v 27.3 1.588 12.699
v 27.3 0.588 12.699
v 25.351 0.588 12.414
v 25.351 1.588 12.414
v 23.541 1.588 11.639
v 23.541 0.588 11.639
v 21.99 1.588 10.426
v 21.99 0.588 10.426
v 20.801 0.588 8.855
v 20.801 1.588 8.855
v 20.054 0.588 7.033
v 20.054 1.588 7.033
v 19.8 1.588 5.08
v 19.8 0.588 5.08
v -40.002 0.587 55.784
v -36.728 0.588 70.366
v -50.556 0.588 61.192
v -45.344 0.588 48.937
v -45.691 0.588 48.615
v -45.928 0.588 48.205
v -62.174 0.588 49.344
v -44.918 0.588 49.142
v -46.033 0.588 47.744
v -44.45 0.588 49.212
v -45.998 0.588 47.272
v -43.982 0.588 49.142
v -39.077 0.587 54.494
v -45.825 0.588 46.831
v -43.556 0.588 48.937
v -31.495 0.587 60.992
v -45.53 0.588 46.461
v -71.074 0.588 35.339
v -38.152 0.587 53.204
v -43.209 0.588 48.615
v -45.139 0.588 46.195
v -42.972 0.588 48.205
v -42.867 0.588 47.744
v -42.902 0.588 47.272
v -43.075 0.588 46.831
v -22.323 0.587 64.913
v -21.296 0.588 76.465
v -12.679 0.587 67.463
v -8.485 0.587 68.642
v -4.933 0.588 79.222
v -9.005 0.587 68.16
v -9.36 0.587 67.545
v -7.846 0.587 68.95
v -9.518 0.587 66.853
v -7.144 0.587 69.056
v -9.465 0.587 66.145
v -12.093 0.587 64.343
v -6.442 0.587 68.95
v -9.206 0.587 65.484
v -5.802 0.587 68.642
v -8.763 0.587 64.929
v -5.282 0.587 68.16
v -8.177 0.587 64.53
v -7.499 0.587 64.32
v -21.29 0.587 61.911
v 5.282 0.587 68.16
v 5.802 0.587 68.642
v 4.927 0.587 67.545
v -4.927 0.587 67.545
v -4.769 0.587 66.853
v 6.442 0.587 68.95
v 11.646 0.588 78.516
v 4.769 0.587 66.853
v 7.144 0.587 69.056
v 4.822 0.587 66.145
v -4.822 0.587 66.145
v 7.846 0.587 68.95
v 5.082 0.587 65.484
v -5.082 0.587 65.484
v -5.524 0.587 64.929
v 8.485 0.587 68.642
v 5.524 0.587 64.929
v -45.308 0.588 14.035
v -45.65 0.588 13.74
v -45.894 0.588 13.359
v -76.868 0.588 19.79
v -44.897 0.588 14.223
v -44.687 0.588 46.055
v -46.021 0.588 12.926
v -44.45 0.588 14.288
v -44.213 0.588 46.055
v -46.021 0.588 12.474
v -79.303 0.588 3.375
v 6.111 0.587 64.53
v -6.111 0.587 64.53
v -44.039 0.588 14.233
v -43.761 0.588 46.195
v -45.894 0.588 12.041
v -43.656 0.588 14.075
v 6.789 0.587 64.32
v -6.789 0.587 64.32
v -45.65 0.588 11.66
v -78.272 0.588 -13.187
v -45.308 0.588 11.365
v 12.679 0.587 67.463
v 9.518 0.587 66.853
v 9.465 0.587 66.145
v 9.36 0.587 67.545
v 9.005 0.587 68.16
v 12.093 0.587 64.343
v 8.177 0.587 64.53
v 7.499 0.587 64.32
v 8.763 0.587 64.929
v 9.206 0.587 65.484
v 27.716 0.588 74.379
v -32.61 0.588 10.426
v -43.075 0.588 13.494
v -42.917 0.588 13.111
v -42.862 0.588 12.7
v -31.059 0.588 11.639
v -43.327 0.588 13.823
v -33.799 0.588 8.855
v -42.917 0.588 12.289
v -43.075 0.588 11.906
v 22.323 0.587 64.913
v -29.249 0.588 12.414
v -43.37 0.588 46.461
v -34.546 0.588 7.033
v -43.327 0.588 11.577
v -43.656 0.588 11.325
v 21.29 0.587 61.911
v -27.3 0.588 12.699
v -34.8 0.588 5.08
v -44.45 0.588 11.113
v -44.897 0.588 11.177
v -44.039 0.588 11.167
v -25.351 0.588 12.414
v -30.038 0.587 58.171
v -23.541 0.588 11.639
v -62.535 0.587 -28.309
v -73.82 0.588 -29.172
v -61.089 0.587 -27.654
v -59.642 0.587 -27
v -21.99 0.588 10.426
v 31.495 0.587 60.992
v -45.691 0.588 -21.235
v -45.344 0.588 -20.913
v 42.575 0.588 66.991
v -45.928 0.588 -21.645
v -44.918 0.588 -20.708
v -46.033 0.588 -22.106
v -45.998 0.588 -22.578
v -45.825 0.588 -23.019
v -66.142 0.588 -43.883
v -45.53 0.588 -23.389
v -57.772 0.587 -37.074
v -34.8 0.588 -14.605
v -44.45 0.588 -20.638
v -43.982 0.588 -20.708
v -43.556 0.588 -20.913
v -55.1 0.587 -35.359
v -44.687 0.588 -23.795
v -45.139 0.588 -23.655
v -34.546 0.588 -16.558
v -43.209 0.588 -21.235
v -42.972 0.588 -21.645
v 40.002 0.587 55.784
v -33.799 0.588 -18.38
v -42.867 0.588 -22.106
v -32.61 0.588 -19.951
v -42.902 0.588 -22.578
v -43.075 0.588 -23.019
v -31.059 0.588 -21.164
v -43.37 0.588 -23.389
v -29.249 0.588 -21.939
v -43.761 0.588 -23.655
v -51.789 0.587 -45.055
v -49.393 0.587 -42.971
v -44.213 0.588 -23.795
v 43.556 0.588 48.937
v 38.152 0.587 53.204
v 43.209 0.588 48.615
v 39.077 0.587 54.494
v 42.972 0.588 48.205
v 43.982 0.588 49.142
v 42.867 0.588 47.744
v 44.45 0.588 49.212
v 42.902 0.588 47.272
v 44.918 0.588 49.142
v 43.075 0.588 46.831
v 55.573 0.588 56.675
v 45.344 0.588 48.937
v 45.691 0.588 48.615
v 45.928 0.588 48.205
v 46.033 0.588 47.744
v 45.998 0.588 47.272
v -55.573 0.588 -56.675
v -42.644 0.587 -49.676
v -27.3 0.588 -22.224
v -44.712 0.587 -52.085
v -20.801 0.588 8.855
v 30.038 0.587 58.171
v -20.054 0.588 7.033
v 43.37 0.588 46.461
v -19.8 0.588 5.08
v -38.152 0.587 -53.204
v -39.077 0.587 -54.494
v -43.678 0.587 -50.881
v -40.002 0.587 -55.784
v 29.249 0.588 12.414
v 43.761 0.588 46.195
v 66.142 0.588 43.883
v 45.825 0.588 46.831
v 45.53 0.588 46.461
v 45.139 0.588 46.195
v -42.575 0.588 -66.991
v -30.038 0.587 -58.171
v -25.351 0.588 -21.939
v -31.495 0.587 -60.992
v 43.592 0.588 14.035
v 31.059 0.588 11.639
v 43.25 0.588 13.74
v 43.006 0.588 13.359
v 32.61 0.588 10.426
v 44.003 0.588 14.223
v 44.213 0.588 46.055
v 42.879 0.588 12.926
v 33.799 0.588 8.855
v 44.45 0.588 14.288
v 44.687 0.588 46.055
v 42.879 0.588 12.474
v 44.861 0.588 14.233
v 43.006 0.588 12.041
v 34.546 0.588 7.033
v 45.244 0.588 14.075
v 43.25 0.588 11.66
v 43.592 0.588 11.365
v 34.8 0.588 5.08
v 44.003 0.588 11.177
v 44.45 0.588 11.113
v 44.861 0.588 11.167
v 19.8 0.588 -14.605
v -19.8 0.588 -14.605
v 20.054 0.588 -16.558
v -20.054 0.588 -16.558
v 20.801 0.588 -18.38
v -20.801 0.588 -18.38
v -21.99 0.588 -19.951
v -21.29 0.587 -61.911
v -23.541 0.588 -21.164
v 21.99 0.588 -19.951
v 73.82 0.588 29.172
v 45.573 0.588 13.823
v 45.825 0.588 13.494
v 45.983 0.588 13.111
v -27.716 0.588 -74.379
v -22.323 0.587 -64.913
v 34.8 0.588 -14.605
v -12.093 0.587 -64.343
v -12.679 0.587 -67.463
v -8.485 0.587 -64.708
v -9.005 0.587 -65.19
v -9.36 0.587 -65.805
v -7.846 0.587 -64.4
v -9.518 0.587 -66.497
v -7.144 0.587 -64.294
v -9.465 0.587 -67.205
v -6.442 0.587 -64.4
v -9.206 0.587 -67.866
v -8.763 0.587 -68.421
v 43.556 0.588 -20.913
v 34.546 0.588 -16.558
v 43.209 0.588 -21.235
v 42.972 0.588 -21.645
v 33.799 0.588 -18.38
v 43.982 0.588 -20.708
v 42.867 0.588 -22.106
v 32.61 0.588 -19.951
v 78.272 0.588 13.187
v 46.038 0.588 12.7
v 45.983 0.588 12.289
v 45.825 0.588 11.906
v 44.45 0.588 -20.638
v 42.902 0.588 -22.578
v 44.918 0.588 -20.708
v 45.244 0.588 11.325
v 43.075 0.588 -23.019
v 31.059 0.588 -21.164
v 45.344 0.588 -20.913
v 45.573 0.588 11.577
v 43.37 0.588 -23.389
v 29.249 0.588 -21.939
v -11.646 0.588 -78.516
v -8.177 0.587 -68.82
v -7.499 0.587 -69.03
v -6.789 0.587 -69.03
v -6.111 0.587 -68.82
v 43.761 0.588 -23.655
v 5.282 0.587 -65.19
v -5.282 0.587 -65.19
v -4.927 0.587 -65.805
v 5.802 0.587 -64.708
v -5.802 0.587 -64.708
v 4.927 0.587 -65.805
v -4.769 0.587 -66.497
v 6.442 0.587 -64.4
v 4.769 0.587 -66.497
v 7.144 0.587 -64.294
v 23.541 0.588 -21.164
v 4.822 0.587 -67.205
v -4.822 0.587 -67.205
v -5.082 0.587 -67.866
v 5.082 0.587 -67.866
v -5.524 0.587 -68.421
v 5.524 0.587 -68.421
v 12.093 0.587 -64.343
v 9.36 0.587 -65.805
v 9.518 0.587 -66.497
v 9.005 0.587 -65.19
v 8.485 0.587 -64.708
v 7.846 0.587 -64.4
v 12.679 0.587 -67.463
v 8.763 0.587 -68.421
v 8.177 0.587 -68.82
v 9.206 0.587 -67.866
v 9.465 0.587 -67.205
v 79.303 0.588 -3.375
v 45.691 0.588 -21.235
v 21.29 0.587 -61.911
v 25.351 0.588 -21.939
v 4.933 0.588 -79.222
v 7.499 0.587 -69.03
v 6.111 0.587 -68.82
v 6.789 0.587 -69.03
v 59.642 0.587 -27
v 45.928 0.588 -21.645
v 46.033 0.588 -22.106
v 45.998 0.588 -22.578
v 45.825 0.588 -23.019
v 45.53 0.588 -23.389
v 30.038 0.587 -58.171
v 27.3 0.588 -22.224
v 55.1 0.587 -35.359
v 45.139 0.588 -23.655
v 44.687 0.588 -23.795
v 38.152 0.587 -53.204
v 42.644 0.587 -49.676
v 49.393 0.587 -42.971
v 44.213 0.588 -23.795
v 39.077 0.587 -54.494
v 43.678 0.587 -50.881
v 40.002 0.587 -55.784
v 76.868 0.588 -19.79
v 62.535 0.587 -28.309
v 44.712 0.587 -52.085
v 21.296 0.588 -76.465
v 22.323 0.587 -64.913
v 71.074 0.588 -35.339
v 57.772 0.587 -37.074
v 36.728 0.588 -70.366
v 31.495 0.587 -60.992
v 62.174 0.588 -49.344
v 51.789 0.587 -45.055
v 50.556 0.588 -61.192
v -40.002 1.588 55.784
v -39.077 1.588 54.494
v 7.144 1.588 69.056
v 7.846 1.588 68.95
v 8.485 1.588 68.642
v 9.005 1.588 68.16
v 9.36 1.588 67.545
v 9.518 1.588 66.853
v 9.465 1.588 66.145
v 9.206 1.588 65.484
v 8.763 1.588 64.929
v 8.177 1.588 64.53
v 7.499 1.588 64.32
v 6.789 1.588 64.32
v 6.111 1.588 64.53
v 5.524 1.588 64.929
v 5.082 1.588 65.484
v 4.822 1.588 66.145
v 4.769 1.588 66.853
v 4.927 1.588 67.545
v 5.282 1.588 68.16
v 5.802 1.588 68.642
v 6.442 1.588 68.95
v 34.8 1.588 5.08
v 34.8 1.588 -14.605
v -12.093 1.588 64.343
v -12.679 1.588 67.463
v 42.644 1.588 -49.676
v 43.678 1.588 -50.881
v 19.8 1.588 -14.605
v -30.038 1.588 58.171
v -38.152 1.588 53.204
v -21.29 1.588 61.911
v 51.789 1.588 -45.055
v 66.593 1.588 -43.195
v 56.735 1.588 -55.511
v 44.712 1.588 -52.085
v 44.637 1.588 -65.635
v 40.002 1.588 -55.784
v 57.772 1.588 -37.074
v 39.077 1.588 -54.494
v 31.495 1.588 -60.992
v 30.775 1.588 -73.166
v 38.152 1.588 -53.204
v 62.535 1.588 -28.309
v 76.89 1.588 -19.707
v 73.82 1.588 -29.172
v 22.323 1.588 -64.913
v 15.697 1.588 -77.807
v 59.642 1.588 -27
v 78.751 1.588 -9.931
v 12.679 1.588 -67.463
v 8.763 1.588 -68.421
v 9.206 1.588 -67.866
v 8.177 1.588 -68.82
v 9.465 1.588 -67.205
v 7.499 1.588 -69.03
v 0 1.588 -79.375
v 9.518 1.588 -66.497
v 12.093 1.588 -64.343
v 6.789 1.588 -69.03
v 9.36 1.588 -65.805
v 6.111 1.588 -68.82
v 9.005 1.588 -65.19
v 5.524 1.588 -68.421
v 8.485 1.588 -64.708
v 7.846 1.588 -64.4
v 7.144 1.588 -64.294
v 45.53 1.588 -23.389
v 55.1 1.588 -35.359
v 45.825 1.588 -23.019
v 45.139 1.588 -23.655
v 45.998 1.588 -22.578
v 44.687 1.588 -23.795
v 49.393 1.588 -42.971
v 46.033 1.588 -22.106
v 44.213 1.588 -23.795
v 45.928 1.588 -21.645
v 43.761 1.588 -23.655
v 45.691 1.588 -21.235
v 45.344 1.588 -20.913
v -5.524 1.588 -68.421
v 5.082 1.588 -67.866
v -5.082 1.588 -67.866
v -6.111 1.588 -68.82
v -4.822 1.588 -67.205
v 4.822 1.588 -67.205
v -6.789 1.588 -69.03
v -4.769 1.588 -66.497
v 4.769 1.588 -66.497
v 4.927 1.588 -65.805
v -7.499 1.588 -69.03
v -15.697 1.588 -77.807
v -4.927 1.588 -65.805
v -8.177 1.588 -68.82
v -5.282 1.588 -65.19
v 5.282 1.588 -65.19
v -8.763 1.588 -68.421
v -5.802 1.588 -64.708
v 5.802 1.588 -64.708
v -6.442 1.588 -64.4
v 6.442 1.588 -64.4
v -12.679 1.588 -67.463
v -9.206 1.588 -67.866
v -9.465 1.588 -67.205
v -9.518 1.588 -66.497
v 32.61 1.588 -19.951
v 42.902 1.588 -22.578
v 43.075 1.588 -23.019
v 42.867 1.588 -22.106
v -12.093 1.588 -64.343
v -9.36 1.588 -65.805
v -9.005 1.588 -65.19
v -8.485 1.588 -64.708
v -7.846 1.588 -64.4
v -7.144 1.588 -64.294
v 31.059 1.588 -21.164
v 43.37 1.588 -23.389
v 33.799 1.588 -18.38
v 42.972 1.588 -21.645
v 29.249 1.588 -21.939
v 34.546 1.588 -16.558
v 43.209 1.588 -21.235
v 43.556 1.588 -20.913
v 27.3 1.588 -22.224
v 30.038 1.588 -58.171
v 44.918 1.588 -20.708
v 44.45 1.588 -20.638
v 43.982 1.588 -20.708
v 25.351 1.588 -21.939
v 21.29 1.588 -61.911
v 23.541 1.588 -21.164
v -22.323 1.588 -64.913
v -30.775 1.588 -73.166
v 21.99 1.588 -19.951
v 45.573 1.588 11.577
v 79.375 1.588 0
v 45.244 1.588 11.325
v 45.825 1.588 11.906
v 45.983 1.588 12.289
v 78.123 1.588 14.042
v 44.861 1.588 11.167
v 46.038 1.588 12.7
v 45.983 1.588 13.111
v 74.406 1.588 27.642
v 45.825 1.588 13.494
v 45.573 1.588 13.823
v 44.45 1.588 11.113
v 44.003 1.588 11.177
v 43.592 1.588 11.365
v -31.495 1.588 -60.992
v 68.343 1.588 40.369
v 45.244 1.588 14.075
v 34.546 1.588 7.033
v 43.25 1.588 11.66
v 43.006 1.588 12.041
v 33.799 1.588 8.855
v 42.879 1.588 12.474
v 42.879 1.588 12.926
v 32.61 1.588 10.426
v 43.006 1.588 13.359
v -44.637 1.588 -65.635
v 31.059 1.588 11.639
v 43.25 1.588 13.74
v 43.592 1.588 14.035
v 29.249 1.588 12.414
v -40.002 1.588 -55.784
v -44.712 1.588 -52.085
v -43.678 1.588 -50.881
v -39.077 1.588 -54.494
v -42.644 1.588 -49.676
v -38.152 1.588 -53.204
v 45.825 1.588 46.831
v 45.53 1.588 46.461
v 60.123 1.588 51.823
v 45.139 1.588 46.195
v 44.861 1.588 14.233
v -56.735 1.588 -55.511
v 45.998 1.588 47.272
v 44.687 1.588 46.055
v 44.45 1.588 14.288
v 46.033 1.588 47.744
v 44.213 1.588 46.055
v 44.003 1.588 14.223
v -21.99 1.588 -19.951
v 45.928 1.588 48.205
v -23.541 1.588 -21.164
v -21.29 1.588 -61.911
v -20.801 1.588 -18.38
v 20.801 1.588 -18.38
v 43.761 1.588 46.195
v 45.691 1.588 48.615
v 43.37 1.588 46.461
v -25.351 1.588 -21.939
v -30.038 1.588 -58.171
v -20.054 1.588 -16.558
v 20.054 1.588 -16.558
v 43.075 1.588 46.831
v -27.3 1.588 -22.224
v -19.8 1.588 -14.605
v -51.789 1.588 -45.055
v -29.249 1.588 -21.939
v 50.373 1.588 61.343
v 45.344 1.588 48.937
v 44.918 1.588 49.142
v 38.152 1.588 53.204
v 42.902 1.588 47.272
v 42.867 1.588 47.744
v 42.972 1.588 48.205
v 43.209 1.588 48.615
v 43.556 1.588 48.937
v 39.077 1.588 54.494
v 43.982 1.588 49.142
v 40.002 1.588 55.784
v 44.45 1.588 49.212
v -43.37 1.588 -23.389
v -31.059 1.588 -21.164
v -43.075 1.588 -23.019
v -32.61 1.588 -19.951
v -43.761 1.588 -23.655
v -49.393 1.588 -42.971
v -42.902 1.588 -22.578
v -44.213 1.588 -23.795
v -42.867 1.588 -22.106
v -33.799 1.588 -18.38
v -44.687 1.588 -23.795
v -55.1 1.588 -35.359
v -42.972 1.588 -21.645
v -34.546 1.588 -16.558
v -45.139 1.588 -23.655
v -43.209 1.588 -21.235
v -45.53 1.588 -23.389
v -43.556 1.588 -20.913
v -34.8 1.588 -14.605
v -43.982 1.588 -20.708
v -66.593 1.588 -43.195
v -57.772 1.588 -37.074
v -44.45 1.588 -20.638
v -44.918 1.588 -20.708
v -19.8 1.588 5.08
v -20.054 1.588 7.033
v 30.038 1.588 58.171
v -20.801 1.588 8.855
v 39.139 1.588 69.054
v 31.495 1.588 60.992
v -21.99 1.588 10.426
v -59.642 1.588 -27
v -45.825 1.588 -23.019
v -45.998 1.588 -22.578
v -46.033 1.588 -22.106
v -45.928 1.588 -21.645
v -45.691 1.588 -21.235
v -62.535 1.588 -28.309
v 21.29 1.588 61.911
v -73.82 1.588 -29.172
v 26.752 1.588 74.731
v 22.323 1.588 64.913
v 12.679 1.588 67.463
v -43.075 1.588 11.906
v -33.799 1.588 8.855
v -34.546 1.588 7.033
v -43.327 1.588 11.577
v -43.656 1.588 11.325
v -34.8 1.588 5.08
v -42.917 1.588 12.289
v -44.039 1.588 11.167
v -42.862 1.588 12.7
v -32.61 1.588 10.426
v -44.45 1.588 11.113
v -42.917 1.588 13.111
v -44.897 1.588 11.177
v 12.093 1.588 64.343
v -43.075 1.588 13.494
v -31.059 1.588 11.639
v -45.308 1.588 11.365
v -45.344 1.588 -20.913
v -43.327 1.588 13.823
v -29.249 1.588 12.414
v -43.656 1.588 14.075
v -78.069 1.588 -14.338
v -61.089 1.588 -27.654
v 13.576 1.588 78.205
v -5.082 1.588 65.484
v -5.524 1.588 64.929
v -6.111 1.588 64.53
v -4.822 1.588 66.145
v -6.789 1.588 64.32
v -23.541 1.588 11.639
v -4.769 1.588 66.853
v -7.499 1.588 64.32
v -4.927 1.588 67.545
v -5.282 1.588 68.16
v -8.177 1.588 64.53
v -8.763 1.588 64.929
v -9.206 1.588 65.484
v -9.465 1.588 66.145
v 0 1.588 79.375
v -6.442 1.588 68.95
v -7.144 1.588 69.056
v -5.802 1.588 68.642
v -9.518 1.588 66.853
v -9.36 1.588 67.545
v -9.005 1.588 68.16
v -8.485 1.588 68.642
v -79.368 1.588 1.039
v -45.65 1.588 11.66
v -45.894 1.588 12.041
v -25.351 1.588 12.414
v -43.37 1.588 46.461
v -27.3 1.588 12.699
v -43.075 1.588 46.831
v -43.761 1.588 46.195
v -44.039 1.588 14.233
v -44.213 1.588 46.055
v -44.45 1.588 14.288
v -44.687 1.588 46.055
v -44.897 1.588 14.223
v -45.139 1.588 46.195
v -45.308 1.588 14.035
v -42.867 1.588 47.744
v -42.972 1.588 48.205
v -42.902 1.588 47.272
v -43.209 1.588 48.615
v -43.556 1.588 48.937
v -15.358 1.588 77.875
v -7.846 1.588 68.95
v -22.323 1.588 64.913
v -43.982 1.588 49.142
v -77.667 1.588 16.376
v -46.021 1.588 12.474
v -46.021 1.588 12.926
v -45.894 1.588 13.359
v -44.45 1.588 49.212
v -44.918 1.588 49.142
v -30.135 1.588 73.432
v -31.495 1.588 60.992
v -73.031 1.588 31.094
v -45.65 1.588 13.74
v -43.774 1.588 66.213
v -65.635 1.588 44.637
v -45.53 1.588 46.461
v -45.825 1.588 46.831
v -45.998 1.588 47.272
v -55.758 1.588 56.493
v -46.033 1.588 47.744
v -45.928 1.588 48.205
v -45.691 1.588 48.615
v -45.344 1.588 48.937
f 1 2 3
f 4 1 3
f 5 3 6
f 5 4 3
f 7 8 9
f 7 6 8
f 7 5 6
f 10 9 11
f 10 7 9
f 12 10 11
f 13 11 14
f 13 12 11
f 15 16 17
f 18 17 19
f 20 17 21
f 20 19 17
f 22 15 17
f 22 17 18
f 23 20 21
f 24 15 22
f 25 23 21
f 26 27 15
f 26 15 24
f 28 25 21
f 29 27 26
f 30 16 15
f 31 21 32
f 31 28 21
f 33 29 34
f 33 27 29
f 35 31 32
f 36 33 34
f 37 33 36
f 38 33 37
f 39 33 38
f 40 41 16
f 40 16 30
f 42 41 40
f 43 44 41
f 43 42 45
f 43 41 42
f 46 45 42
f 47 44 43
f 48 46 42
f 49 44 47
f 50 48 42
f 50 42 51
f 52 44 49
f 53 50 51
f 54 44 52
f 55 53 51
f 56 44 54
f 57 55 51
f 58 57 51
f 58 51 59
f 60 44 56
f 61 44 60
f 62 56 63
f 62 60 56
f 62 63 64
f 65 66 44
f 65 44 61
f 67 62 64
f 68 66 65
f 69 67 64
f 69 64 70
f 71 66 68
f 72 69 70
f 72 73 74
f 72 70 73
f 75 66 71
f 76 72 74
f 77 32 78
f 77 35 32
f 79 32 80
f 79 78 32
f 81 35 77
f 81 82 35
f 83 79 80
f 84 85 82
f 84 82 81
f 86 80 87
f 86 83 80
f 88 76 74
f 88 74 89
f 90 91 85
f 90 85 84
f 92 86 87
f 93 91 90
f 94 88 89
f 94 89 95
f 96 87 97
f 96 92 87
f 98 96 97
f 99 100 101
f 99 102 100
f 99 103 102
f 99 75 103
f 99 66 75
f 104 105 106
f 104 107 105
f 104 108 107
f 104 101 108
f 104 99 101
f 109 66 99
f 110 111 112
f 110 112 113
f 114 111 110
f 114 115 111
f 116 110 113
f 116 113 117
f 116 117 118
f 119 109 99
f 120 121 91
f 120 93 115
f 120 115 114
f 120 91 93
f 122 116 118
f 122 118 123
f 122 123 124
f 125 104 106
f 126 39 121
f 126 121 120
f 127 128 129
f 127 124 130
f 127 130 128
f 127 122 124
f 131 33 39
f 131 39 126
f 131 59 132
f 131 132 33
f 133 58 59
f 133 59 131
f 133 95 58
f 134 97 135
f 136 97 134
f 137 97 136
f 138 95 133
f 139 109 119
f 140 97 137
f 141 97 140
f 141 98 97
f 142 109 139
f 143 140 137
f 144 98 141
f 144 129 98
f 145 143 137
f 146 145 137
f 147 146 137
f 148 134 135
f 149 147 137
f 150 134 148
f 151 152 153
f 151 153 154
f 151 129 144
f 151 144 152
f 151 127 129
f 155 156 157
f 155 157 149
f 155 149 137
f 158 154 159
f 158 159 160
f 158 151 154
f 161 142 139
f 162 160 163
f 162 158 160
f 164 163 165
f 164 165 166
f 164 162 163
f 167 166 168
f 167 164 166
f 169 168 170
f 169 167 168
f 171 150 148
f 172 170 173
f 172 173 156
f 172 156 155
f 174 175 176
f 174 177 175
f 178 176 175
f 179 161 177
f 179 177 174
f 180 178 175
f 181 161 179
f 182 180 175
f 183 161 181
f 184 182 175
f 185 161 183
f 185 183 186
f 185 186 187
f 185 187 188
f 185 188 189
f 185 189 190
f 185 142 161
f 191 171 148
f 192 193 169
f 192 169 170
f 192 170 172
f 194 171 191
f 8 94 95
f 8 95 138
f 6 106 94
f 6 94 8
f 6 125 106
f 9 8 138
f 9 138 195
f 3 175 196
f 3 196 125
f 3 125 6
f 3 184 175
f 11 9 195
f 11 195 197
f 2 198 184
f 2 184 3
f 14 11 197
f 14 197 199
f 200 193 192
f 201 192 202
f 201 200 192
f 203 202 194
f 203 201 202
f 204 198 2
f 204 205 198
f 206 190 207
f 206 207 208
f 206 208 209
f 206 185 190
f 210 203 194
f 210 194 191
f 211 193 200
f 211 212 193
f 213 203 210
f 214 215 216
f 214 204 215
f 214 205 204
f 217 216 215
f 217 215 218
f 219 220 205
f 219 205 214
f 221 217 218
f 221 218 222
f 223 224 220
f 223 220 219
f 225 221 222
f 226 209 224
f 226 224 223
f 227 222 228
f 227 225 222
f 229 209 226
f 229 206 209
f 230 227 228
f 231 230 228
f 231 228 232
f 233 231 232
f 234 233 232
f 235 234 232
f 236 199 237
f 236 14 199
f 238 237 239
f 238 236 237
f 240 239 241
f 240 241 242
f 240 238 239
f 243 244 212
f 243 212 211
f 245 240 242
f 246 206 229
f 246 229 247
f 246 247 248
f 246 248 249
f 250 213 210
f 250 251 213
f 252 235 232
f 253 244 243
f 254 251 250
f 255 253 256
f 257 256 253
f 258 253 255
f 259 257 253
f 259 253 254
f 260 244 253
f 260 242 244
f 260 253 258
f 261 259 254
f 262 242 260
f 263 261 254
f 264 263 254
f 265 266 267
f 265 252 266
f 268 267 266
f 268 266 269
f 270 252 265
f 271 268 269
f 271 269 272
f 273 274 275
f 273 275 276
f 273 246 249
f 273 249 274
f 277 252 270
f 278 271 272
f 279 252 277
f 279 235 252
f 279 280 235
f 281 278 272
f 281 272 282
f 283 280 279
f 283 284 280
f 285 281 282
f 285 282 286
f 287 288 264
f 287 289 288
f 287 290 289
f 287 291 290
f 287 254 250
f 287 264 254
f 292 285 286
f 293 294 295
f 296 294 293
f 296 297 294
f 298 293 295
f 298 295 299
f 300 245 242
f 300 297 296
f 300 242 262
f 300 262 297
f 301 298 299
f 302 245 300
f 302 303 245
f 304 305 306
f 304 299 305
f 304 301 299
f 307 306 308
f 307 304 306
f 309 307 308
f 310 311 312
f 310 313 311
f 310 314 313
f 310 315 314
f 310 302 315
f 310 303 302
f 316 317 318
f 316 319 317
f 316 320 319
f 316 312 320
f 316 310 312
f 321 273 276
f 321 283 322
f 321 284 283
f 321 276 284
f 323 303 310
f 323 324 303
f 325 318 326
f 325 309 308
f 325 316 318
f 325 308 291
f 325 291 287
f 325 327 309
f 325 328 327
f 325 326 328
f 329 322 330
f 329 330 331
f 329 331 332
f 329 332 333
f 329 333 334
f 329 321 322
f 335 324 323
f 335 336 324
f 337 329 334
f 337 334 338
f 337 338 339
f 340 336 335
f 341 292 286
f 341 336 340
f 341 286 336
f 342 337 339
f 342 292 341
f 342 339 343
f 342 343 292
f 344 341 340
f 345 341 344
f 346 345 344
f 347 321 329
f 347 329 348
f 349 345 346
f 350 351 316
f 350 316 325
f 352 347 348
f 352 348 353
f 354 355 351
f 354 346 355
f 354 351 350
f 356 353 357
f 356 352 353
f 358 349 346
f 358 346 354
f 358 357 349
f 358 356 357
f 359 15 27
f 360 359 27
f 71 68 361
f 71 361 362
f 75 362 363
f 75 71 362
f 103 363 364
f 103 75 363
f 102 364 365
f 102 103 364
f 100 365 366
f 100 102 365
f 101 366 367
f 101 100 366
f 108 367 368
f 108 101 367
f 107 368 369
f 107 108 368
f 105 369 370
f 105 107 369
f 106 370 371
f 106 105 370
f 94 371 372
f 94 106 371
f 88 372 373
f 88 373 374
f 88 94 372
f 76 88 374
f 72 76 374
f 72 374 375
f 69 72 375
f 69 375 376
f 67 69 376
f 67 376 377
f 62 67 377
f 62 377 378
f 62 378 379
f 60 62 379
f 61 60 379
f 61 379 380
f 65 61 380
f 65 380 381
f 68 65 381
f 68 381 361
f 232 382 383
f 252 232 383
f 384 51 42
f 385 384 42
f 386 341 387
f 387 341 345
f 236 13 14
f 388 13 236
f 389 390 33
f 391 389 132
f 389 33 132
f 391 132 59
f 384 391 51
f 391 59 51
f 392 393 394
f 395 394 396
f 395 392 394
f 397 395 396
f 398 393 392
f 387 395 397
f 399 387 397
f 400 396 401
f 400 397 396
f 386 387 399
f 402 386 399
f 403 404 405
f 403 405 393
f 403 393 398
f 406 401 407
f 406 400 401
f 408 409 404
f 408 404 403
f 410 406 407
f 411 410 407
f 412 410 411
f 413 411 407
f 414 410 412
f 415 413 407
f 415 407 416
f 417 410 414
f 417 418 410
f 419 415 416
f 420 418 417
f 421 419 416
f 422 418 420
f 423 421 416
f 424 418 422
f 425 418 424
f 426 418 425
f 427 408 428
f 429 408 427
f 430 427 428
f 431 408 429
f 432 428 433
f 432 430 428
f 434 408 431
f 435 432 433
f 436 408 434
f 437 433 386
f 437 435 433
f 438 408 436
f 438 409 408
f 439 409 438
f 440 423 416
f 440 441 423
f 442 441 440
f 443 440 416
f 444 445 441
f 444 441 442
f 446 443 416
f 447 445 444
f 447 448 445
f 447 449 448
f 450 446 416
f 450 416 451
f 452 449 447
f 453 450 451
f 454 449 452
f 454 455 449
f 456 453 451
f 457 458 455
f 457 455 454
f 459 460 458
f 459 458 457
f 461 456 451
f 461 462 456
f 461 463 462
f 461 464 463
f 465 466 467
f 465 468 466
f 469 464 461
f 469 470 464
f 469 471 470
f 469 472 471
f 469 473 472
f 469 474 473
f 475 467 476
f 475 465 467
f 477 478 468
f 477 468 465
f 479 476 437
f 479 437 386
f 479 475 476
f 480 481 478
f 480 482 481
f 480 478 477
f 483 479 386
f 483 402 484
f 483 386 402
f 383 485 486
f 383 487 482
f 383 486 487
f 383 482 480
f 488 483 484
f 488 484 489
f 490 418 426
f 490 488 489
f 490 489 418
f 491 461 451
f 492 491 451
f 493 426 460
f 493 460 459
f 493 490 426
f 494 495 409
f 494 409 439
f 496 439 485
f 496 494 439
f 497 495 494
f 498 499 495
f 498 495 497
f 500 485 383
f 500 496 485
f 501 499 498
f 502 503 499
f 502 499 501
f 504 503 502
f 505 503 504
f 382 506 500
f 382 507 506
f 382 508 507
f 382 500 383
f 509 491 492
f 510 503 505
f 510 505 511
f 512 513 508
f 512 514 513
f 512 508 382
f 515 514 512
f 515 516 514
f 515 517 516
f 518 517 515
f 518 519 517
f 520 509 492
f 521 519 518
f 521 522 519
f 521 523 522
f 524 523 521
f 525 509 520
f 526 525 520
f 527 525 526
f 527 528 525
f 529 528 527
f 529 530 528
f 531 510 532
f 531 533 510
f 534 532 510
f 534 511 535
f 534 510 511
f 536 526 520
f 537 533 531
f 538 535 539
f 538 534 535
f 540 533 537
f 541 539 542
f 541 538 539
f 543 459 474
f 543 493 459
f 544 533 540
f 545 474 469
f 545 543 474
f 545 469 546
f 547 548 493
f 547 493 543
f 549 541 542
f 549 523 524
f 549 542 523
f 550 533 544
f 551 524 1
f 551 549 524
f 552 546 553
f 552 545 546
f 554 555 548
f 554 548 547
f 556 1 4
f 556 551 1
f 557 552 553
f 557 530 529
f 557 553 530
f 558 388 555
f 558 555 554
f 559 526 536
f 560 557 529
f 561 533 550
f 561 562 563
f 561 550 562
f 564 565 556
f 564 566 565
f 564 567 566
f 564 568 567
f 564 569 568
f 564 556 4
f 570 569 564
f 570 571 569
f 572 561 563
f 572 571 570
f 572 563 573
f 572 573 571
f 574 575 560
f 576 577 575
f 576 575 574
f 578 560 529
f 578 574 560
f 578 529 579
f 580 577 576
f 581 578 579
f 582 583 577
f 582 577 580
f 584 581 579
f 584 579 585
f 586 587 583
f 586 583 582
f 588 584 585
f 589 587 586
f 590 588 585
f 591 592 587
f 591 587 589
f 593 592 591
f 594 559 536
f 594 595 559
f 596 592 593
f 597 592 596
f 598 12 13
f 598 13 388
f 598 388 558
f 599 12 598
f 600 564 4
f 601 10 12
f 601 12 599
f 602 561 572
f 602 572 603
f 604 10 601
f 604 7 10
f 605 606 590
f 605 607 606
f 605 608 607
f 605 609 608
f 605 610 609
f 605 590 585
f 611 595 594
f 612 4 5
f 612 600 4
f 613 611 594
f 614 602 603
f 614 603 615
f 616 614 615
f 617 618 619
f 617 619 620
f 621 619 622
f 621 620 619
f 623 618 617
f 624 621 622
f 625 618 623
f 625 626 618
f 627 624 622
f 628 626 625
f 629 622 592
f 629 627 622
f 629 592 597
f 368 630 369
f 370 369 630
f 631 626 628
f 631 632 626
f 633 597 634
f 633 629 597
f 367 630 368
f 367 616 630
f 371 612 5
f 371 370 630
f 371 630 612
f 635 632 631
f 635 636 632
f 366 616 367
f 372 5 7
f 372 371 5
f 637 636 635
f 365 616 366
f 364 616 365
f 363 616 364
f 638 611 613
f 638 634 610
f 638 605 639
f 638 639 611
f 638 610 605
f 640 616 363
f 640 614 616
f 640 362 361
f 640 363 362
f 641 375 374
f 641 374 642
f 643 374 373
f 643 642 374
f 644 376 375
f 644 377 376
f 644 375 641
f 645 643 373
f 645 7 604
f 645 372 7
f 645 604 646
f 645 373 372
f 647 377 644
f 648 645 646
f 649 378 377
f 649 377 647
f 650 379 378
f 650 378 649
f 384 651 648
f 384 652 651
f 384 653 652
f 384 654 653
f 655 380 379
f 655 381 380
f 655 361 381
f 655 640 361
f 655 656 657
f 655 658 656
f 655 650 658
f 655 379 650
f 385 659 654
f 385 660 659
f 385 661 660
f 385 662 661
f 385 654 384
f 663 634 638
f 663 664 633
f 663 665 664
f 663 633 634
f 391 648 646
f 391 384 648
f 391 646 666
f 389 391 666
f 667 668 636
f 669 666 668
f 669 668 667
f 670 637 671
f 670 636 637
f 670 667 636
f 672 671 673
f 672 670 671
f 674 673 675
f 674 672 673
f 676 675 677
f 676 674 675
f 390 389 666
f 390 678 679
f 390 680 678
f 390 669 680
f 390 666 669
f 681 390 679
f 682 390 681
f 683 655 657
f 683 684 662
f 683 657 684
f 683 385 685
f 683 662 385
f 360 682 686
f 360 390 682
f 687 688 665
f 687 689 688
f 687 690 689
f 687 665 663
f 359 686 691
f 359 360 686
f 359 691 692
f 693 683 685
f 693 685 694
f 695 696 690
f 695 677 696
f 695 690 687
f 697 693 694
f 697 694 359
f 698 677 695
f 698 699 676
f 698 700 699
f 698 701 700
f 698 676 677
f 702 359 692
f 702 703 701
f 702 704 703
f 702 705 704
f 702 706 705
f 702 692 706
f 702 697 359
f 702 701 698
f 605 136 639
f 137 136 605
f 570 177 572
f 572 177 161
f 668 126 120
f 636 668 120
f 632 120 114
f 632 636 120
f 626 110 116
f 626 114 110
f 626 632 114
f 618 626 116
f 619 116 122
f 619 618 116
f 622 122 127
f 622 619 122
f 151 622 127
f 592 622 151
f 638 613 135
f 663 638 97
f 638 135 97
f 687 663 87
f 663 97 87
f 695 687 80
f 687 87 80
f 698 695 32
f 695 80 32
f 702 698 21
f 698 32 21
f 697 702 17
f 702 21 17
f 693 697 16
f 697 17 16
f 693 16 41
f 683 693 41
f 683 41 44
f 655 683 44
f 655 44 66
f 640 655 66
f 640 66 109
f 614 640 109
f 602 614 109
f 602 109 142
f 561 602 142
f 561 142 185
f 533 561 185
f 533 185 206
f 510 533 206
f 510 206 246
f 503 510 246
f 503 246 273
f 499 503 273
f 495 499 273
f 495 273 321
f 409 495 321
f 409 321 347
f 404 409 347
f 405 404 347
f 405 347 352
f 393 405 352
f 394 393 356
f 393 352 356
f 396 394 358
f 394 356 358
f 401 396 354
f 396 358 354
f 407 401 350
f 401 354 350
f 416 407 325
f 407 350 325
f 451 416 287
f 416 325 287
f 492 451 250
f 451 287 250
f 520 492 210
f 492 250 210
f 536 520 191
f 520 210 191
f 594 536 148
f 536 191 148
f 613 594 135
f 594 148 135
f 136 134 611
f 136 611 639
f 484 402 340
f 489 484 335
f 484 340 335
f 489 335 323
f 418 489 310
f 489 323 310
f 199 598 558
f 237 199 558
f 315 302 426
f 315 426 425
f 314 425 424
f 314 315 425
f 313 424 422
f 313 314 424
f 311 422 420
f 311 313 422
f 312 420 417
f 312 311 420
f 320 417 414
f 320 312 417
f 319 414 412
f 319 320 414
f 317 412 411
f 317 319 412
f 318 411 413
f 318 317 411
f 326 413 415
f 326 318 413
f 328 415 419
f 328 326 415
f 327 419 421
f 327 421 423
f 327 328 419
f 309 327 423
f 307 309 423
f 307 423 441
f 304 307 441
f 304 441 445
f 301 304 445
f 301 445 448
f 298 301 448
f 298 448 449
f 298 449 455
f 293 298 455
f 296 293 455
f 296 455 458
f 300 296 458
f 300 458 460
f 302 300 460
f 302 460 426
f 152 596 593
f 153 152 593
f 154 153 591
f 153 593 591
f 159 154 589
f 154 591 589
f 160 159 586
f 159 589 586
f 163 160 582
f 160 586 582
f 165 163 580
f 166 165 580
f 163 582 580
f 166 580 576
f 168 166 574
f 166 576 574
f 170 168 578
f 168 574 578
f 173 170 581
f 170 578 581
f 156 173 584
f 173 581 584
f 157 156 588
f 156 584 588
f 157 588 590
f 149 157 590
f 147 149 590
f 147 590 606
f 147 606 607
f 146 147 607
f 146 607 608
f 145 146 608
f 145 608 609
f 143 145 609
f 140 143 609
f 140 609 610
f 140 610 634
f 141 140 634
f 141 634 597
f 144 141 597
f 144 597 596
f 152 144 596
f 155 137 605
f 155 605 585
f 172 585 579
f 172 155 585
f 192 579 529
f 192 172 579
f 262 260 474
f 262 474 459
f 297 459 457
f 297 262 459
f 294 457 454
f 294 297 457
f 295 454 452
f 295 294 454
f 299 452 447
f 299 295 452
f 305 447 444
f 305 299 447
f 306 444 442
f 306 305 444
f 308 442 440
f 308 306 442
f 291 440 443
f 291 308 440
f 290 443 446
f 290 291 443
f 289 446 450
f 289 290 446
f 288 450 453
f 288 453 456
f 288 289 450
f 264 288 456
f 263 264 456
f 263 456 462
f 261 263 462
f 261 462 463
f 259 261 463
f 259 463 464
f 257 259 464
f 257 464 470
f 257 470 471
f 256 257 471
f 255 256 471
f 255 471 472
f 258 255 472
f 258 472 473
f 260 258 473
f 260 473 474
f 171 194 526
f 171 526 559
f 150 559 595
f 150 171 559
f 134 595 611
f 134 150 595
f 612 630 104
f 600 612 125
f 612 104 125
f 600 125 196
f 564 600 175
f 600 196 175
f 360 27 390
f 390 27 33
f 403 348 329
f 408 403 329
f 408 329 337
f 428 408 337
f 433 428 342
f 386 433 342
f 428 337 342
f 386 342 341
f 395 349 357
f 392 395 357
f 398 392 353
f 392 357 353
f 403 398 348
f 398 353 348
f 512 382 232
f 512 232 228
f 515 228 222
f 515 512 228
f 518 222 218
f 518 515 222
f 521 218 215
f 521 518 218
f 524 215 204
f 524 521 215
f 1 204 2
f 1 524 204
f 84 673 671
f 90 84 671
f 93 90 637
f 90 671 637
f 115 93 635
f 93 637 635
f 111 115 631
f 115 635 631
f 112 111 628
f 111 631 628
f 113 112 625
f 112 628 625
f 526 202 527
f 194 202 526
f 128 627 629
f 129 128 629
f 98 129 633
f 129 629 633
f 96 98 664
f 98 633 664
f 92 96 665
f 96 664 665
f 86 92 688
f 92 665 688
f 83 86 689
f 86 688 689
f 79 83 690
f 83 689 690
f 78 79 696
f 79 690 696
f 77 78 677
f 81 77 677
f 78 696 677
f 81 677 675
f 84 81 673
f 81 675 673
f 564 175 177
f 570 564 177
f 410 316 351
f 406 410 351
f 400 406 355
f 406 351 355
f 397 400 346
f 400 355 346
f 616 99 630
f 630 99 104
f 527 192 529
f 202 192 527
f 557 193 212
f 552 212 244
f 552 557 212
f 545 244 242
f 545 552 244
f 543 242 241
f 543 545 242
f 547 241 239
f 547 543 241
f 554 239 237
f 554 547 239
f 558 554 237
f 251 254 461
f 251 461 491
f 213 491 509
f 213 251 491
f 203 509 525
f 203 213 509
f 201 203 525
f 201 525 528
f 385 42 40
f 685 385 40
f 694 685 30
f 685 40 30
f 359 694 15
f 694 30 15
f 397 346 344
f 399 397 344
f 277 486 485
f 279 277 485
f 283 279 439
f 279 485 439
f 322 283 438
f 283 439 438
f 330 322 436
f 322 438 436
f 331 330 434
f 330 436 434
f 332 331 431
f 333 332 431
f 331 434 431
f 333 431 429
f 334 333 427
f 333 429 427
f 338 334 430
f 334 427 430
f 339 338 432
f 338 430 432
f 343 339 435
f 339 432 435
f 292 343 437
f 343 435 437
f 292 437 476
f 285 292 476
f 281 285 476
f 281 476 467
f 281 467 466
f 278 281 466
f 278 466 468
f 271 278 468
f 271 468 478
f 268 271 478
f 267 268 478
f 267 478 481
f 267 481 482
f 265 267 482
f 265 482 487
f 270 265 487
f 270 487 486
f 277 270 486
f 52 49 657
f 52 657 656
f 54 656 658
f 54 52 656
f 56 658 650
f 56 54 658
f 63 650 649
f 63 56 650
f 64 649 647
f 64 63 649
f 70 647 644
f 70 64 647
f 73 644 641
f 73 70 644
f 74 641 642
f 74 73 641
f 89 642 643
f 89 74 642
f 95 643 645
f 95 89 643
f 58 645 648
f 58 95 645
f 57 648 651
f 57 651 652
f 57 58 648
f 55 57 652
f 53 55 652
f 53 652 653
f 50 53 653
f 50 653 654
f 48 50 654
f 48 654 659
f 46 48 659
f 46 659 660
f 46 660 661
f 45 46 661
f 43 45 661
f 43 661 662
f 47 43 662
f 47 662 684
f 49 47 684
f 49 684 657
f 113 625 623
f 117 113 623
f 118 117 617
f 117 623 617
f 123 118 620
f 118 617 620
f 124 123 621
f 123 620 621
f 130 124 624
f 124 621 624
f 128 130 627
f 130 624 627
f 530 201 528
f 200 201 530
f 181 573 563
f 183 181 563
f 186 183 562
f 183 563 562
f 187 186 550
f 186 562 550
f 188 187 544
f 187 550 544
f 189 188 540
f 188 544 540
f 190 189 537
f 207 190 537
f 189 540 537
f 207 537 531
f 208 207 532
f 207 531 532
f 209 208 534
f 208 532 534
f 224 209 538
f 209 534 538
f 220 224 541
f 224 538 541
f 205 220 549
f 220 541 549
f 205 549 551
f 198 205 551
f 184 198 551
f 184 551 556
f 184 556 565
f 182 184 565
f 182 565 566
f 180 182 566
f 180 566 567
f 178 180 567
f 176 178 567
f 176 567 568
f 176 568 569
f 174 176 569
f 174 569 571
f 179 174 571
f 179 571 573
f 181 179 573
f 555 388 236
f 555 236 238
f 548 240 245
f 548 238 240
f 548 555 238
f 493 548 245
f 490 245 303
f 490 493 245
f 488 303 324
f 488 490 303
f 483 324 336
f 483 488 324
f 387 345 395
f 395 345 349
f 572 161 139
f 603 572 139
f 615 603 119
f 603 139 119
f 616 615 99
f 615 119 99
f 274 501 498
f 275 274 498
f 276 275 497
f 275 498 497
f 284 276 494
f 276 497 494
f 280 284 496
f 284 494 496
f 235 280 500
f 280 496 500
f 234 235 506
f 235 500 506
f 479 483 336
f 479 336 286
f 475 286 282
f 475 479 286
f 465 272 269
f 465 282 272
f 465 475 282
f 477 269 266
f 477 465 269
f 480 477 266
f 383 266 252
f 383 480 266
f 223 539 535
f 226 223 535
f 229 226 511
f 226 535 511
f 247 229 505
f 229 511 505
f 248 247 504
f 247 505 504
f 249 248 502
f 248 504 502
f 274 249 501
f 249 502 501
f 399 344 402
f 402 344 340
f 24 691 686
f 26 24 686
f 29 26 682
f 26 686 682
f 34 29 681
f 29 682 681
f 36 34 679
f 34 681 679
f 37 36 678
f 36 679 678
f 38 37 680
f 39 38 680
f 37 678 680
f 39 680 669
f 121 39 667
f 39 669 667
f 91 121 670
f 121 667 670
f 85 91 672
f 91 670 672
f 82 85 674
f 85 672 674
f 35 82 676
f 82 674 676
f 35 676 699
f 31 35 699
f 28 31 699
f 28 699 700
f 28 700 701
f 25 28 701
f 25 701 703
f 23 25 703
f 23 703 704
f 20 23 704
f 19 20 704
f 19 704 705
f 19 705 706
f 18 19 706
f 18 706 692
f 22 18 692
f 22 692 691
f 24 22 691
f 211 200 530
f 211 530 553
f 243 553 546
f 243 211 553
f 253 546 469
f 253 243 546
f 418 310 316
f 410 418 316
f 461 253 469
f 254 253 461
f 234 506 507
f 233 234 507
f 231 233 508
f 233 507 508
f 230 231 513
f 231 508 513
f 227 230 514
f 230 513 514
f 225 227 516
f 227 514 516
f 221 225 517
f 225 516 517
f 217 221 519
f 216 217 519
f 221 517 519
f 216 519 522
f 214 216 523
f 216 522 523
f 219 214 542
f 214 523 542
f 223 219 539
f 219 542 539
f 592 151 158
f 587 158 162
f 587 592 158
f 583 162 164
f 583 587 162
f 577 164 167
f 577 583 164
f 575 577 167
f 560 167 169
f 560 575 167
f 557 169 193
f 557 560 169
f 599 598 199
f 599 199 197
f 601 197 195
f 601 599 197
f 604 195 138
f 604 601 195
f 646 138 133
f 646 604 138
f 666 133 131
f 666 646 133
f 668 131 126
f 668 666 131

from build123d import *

# Parameters (mm, degrees)
SKETCH1_R           = 1.5875
BOSS_EXTRUDE5_DEPTH = 1.5875
FILLET2_R           = 2.54
FILLET3_R           = 2.54
FILLET4_R           = 5.08
CUT_EXTRUDE1_START  = -2.54
SKETCH2_R           = 2.38125
SKETCH2_R_2         = 1.5875
CUT_EXTRUDE1_DEPTH  = 2.54
SKETCH3_R           = 1.5875
CUT_EXTRUDE2_DEPTH  = 2.54
CUT_EXTRUDE3_DEPTH  = 2.54
SKETCH5_W           = 15
SKETCH5_H           = 34.925
CUT_EXTRUDE4_DEPTH  = 109.650407999
FILLET5_R           = 7.62
FILLET6_R           = 7.62
BOSS_EXTRUDE6_START = -1.5875
BOSS_EXTRUDE6_DEPTH = 1.5875
SKETCH7_R           = 79.375
CUT_EXTRUDE5_DEPTH  = 0.5875


with BuildPart() as part:
    # Sketch1 → Boss-Extrude5 (new body)
    with BuildSketch(Plane(origin=(0, 0, 0), x_dir=(1, 0, 0), z_dir=(0, 1, 0))):
        with BuildLine():
            ThreePointArc((-63.5, -47.625), (-35.497579143, -70.995158286), (0, -79.375))
            ThreePointArc((0, -79.375), (35.497579143, -70.995158286), (63.5, -47.625))
            Line((63.5, -47.625), (50.8, -47.625))
            Line((50.8, -47.625), (50.8, 22.225))
            Line((50.8, 22.225), (76.2, 22.225))
            ThreePointArc((76.2, 22.225), (0, 79.375), (-76.2, 22.225))
            Line((-76.2, 22.225), (-50.8, 22.225))
            Line((-50.8, 22.225), (-50.8, -47.625))
            Line((-50.8, -47.625), (-63.5, -47.625))
        make_face()
        with Locations(Location((-7.14375, -66.675, 0), (0, 0, 270))):
            Circle(SKETCH1_R, mode=Mode.SUBTRACT)
        with BuildLine():
            ThreePointArc((8.73125, -66.675), (7.14375, -68.2625), (5.55625, -66.675))
            ThreePointArc((5.55625, -66.675), (7.14375, -65.0875), (8.73125, -66.675))
        make_face(mode=Mode.SUBTRACT)
        with Locations(Location((-7.14375, 66.675, 0), (0, 0, 270))):
            Circle(SKETCH1_R, mode=Mode.SUBTRACT)
        with Locations(Location((7.14375, 66.675, 0), (0, 0, 270))):
            Circle(SKETCH1_R, mode=Mode.SUBTRACT)
    extrude(amount=BOSS_EXTRUDE5_DEPTH)

    # Fillet2
    fillet2_edges = [part.edges().sort_by_distance(p)[0] for p in [
        (-63.5, 0.79375, 47.625),
    ]]
    fillet(fillet2_edges, radius=FILLET2_R)

    # Fillet3
    fillet3_edges = [part.edges().sort_by_distance(p)[0] for p in [
        (63.5, 0.79375, 47.625),
    ]]
    fillet(fillet3_edges, radius=FILLET3_R)

    # Fillet4
    fillet4_edges = [part.edges().sort_by_distance(p)[0] for p in [
        (-76.2, 0.79375, -22.225),
        (76.2, 0.79375, -22.225),
    ]]
    fillet(fillet4_edges, radius=FILLET4_R)

    # Sketch2 → Cut-Extrude1 (cut)
    # profile 1 of 10: a face of its own
    with BuildSketch(Plane(origin=(0, 1.5875, 0), x_dir=(1, 0, 0), z_dir=(0, 1, 0)).offset(CUT_EXTRUDE1_START)):
        with BuildLine():
            Line((-61.088622125, 27.654457796), (-59.642408406, 26.999765402))
            ThreePointArc((-59.642408406, 26.999765402), (-52.384826382, 39.268743005), (-42.643785254, 49.676068599))
            Line((-42.643785254, 49.676068599), (-43.677815048, 50.880617741))
            Line((-43.677815048, 50.880617741), (-44.711844841, 52.085166883))
            ThreePointArc((-44.711844841, 52.085166883), (-54.925289002, 41.173126022), (-62.534835843, 28.309150189))
            Line((-62.534835843, 28.309150189), (-61.088622125, 27.654457796))
        make_face()
    # profile 2 of 10: a face of its own
    with BuildSketch(Plane(origin=(0, 1.5875, 0), x_dir=(1, 0, 0), z_dir=(0, 1, 0)).offset(CUT_EXTRUDE1_START)):
        with BuildLine():
            Line((-39.077069744, 54.493774041), (-38.151958122, 53.203686937))
            ThreePointArc((-38.151958122, 53.203686937), (-25.732218917, 60.200142208), (-12.092567045, 64.342629994))
            Line((-12.092567045, 64.342629994), (-12.385788543, 65.902815048))
            Line((-12.385788543, 65.902815048), (-12.679010041, 67.463000102))
            ThreePointArc((-12.679010041, 67.463000102), (-26.980132574, 63.119617589), (-40.002181367, 55.783861145))
            Line((-40.002181367, 55.783861145), (-39.077069744, 54.493774041))
        make_face()
    # profile 3 of 10: a face of its own
    with BuildSketch(Plane(origin=(0, 1.5875, 0), x_dir=(1, 0, 0), z_dir=(0, 1, 0)).offset(CUT_EXTRUDE1_START)):
        with Locations(Location((-7.14375, 66.675, 0), (0, 0, 270))):
            Circle(SKETCH2_R)
        with Locations((-7.14375, 66.675)):
            Circle(SKETCH2_R_2, mode=Mode.SUBTRACT)
    # profile 4 of 10: a face of its own
    with BuildSketch(Plane(origin=(0, 1.5875, 0), x_dir=(1, 0, 0), z_dir=(0, 1, 0)).offset(CUT_EXTRUDE1_START)):
        with Locations(Location((7.14375, 66.675, 0), (0, 0, 270))):
            Circle(SKETCH2_R)
        with Locations((7.14375, 66.675)):
            Circle(SKETCH2_R_2, mode=Mode.SUBTRACT)
    # profile 5 of 10: a face of its own
    with BuildSketch(Plane(origin=(0, 1.5875, 0), x_dir=(1, 0, 0), z_dir=(0, 1, 0)).offset(CUT_EXTRUDE1_START)):
        with BuildLine():
            ThreePointArc((12.679010041, 67.463000102), (26.980132574, 63.119617589), (40.002181367, 55.783861145))
            Line((40.002181367, 55.783861145), (39.077069744, 54.493774041))
            Line((39.077069744, 54.493774041), (38.151958122, 53.203686937))
            ThreePointArc((38.151958122, 53.203686937), (25.732218917, 60.200142208), (12.092567045, 64.342629994))
            Line((12.092567045, 64.342629994), (12.385788543, 65.902815048))
            Line((12.385788543, 65.902815048), (12.679010041, 67.463000102))
        make_face()
    # profile 6 of 10: a face of its own
    with BuildSketch(Plane(origin=(0, 1.5875, 0), x_dir=(1, 0, 0), z_dir=(0, 1, 0)).offset(CUT_EXTRUDE1_START)):
        with BuildLine():
            ThreePointArc((44.711844841, 52.085166883), (54.925289002, 41.173126022), (62.534835843, 28.309150189))
            Line((62.534835843, 28.309150189), (59.642408406, 26.999765402))
            ThreePointArc((59.642408406, 26.999765402), (52.384826382, 39.268743005), (42.643785254, 49.676068599))
            Line((42.643785254, 49.676068599), (43.677815048, 50.880617741))
            Line((43.677815048, 50.880617741), (44.711844841, 52.085166883))
        make_face()
    # profile 7 of 10: a face of its own
    with BuildSketch(Plane(origin=(0, 1.5875, 0), x_dir=(1, 0, 0), z_dir=(0, 1, 0)).offset(CUT_EXTRUDE1_START)):
        with BuildLine():
            ThreePointArc((-12.679010041, -67.463000102), (-26.980132574, -63.119617589), (-40.002181367, -55.783861145))
            Line((-40.002181367, -55.783861145), (-39.077069744, -54.493774041))
            Line((-39.077069744, -54.493774041), (-38.151958122, -53.203686937))
            ThreePointArc((-38.151958122, -53.203686937), (-25.732218917, -60.200142208), (-12.092567045, -64.342629994))
            Line((-12.092567045, -64.342629994), (-12.385788543, -65.902815048))
            Line((-12.385788543, -65.902815048), (-12.679010041, -67.463000102))
        make_face()
    # profile 8 of 10: a face of its own
    with BuildSketch(Plane(origin=(0, 1.5875, 0), x_dir=(1, 0, 0), z_dir=(0, 1, 0)).offset(CUT_EXTRUDE1_START)):
        with Locations(Location((-7.14375, -66.675, 0), (0, 0, 270))):
            Circle(SKETCH2_R)
        with Locations((-7.14375, -66.675)):
            Circle(SKETCH2_R_2, mode=Mode.SUBTRACT)
    # profile 9 of 10: a face of its own
    with BuildSketch(Plane(origin=(0, 1.5875, 0), x_dir=(1, 0, 0), z_dir=(0, 1, 0)).offset(CUT_EXTRUDE1_START)):
        with Locations(Location((7.14375, -66.675, 0), (0, 0, 270))):
            Circle(SKETCH2_R)
        with Locations((7.14375, -66.675)):
            Circle(SKETCH2_R_2, mode=Mode.SUBTRACT)
    # profile 10 of 10: a face of its own
    with BuildSketch(Plane(origin=(0, 1.5875, 0), x_dir=(1, 0, 0), z_dir=(0, 1, 0)).offset(CUT_EXTRUDE1_START)):
        with BuildLine():
            ThreePointArc((12.092567045, -64.342629994), (25.732218917, -60.200142208), (38.151958122, -53.203686937))
            Line((38.151958122, -53.203686937), (39.077069744, -54.493774041))
            Line((39.077069744, -54.493774041), (40.002181367, -55.783861145))
            ThreePointArc((40.002181367, -55.783861145), (26.980132574, -63.119617589), (12.679010041, -67.463000102))
            Line((12.679010041, -67.463000102), (12.385788543, -65.902815048))
            Line((12.385788543, -65.902815048), (12.092567045, -64.342629994))
        make_face()
    extrude(amount=CUT_EXTRUDE1_DEPTH, mode=Mode.SUBTRACT)

    # Sketch3 → Cut-Extrude2 (cut)
    with BuildSketch(Plane(origin=(0, 1.5875, 0), x_dir=(1, 0, 0), z_dir=(0, 1, 0))):
        with Locations(Location((-44.45, -47.625, 0), (0, 0, 270))):
            Circle(SKETCH3_R)
        with Locations(Location((-44.45, 22.225, 0), (0, 0, 270))):
            Circle(SKETCH3_R)
        with Locations(Location((44.45, 22.225, 0), (0, 0, 270))):
            Circle(SKETCH3_R)
        with Locations(Location((44.45, -47.625, 0), (0, 0, 270))):
            Circle(SKETCH3_R)
    extrude(amount=-CUT_EXTRUDE2_DEPTH, mode=Mode.SUBTRACT)

    # Sketch4 → Cut-Extrude3 (cut)
    with BuildSketch(Plane(origin=(0, 1.5875, 0), x_dir=(1, 0, 0), z_dir=(0, 1, 0))):
        with BuildLine():
            ThreePointArc((-44.45, -11.1125), (-46.0375, -12.7), (-44.45, -14.2875))
            Line((-44.45, -14.2875), (-44.45, -11.1125))
        make_face()
        with BuildLine():
            Line((-44.45, -11.1125), (-44.45, -14.2875))
            ThreePointArc((-44.45, -14.2875), (-43.327467985, -13.822532015), (-42.8625, -12.7))
            ThreePointArc((-42.8625, -12.7), (-43.327467985, -11.577467985), (-44.45, -11.1125))
        make_face()
        with BuildLine():
            ThreePointArc((44.45, -11.1125), (42.8625, -12.7), (44.45, -14.2875))
            Line((44.45, -14.2875), (44.45, -11.1125))
        make_face()
        with BuildLine():
            Line((44.45, -11.1125), (44.45, -14.2875))
            ThreePointArc((44.45, -14.2875), (45.572532015, -13.822532015), (46.0375, -12.7))
            ThreePointArc((46.0375, -12.7), (45.572532015, -11.577467985), (44.45, -11.1125))
        make_face()
    extrude(amount=-CUT_EXTRUDE3_DEPTH, mode=Mode.SUBTRACT)

    # Sketch5 → Cut-Extrude4 (cut, through all)
    with BuildSketch(Plane(origin=(0, 1.5875, 0), x_dir=(1, 0, 0), z_dir=(0, 1, 0))):
        with Locations((-27.3, 4.7625)):
            Rectangle(SKETCH5_W, SKETCH5_H)
        with Locations((27.3, 4.7625)):
            Rectangle(SKETCH5_W, SKETCH5_H)
    extrude(amount=-CUT_EXTRUDE4_DEPTH, mode=Mode.SUBTRACT)

    # Fillet5
    # the kernel refuses this fillet: 7.62 mm, written as the material it adds along each edge
    with BuildSketch(Plane(origin=(-19.8, 1.5875, 12.7), x_dir=(0, 0, -1), z_dir=(0, -1, 0))) as fillet5_piece_1:
        with BuildLine():
            CenterArc((FILLET5_R, -FILLET5_R), FILLET5_R, 90, 90)
            Line((0, -FILLET5_R), (0, 0))
            Line((0, 0), (FILLET5_R, 0))
        make_face()
    extrude(amount=1.5875)
    with BuildSketch(Plane(origin=(-34.8, 1.5875, 12.7), x_dir=(0, 0, -1), z_dir=(0, -1, 0)), Plane(origin=(-19.8, 1.5875, -22.225), x_dir=(0, 0, 1), z_dir=(0, -1, 0)), Plane(origin=(-34.8, 1.5875, -22.225), x_dir=(1, 0, 0), z_dir=(0, -1, 0))) as fillet5_piece_2:
        with BuildLine():
            CenterArc((FILLET5_R, FILLET5_R), FILLET5_R, 180, 90)
            Line((0, FILLET5_R), (0, 0))
            Line((0, 0), (FILLET5_R, 0))
        make_face()
    extrude(amount=1.5875)

    # Fillet6
    # the kernel refuses this fillet: 7.62 mm, written as the material it adds along each edge
    with BuildSketch(Plane(origin=(34.8, 1.5875, 12.7), x_dir=(0, 0, -1), z_dir=(0, -1, 0)), Plane(origin=(34.8, 1.5875, -22.225), x_dir=(-1, 0, 0), z_dir=(0, -1, 0))) as fillet6_piece_1:
        with BuildLine():
            CenterArc((FILLET6_R, -FILLET6_R), FILLET6_R, 90, 90)
            Line((0, -FILLET6_R), (0, 0))
            Line((0, 0), (FILLET6_R, 0))
        make_face()
    extrude(amount=1.5875)
    with BuildSketch(Plane(origin=(19.8, 1.5875, -22.225), x_dir=(1, 0, 0), z_dir=(0, -1, 0)), Plane(origin=(19.8, 1.5875, 12.7), x_dir=(0, 0, -1), z_dir=(0, -1, 0))) as fillet6_piece_2:
        with BuildLine():
            CenterArc((FILLET6_R, FILLET6_R), FILLET6_R, 180, 90)
            Line((0, FILLET6_R), (0, 0))
            Line((0, 0), (FILLET6_R, 0))
        make_face()
    extrude(amount=1.5875)

    # Sketch6 → Boss-Extrude6 (add)
    with BuildSketch(Plane(origin=(0, 1.5875, 0), x_dir=(1, 0, 0), z_dir=(0, 1, 0)).offset(BOSS_EXTRUDE6_START)):
        with BuildLine():
            Line((-50.8, -60.989758362), (-50.8, 22.225))
            Line((-50.8, 22.225), (-69.095470184, 22.225))
            Line((-69.095470184, 22.225), (-69.095470184, 39.066694575))
            ThreePointArc((-69.095470184, 39.066694575), (-78.080435361, -14.277122916), (-50.8, -60.989758362))
        make_face()
        with BuildLine():
            Line((50.8, 22.225), (50.8, -60.989758362))
            ThreePointArc((50.8, -60.989758362), (71.877119534, -33.675960454), (79.375, 0))
            ThreePointArc((79.375, 0), (76.762111653, 20.198238526), (69.095470184, 39.066694575))
            Line((69.095470184, 39.066694575), (69.095470184, 22.225))
            Line((69.095470184, 22.225), (50.8, 22.225))
        make_face()
    extrude(amount=BOSS_EXTRUDE6_DEPTH)

    # Sketch7 → Cut-Extrude5 (cut)
    with BuildSketch(Plane.XZ):
        with Locations(Location((0, 0, 0), (0, 0, 270))):
            Circle(SKETCH7_R)
    extrude(amount=-CUT_EXTRUDE5_DEPTH, mode=Mode.SUBTRACT)


solid = part.part
